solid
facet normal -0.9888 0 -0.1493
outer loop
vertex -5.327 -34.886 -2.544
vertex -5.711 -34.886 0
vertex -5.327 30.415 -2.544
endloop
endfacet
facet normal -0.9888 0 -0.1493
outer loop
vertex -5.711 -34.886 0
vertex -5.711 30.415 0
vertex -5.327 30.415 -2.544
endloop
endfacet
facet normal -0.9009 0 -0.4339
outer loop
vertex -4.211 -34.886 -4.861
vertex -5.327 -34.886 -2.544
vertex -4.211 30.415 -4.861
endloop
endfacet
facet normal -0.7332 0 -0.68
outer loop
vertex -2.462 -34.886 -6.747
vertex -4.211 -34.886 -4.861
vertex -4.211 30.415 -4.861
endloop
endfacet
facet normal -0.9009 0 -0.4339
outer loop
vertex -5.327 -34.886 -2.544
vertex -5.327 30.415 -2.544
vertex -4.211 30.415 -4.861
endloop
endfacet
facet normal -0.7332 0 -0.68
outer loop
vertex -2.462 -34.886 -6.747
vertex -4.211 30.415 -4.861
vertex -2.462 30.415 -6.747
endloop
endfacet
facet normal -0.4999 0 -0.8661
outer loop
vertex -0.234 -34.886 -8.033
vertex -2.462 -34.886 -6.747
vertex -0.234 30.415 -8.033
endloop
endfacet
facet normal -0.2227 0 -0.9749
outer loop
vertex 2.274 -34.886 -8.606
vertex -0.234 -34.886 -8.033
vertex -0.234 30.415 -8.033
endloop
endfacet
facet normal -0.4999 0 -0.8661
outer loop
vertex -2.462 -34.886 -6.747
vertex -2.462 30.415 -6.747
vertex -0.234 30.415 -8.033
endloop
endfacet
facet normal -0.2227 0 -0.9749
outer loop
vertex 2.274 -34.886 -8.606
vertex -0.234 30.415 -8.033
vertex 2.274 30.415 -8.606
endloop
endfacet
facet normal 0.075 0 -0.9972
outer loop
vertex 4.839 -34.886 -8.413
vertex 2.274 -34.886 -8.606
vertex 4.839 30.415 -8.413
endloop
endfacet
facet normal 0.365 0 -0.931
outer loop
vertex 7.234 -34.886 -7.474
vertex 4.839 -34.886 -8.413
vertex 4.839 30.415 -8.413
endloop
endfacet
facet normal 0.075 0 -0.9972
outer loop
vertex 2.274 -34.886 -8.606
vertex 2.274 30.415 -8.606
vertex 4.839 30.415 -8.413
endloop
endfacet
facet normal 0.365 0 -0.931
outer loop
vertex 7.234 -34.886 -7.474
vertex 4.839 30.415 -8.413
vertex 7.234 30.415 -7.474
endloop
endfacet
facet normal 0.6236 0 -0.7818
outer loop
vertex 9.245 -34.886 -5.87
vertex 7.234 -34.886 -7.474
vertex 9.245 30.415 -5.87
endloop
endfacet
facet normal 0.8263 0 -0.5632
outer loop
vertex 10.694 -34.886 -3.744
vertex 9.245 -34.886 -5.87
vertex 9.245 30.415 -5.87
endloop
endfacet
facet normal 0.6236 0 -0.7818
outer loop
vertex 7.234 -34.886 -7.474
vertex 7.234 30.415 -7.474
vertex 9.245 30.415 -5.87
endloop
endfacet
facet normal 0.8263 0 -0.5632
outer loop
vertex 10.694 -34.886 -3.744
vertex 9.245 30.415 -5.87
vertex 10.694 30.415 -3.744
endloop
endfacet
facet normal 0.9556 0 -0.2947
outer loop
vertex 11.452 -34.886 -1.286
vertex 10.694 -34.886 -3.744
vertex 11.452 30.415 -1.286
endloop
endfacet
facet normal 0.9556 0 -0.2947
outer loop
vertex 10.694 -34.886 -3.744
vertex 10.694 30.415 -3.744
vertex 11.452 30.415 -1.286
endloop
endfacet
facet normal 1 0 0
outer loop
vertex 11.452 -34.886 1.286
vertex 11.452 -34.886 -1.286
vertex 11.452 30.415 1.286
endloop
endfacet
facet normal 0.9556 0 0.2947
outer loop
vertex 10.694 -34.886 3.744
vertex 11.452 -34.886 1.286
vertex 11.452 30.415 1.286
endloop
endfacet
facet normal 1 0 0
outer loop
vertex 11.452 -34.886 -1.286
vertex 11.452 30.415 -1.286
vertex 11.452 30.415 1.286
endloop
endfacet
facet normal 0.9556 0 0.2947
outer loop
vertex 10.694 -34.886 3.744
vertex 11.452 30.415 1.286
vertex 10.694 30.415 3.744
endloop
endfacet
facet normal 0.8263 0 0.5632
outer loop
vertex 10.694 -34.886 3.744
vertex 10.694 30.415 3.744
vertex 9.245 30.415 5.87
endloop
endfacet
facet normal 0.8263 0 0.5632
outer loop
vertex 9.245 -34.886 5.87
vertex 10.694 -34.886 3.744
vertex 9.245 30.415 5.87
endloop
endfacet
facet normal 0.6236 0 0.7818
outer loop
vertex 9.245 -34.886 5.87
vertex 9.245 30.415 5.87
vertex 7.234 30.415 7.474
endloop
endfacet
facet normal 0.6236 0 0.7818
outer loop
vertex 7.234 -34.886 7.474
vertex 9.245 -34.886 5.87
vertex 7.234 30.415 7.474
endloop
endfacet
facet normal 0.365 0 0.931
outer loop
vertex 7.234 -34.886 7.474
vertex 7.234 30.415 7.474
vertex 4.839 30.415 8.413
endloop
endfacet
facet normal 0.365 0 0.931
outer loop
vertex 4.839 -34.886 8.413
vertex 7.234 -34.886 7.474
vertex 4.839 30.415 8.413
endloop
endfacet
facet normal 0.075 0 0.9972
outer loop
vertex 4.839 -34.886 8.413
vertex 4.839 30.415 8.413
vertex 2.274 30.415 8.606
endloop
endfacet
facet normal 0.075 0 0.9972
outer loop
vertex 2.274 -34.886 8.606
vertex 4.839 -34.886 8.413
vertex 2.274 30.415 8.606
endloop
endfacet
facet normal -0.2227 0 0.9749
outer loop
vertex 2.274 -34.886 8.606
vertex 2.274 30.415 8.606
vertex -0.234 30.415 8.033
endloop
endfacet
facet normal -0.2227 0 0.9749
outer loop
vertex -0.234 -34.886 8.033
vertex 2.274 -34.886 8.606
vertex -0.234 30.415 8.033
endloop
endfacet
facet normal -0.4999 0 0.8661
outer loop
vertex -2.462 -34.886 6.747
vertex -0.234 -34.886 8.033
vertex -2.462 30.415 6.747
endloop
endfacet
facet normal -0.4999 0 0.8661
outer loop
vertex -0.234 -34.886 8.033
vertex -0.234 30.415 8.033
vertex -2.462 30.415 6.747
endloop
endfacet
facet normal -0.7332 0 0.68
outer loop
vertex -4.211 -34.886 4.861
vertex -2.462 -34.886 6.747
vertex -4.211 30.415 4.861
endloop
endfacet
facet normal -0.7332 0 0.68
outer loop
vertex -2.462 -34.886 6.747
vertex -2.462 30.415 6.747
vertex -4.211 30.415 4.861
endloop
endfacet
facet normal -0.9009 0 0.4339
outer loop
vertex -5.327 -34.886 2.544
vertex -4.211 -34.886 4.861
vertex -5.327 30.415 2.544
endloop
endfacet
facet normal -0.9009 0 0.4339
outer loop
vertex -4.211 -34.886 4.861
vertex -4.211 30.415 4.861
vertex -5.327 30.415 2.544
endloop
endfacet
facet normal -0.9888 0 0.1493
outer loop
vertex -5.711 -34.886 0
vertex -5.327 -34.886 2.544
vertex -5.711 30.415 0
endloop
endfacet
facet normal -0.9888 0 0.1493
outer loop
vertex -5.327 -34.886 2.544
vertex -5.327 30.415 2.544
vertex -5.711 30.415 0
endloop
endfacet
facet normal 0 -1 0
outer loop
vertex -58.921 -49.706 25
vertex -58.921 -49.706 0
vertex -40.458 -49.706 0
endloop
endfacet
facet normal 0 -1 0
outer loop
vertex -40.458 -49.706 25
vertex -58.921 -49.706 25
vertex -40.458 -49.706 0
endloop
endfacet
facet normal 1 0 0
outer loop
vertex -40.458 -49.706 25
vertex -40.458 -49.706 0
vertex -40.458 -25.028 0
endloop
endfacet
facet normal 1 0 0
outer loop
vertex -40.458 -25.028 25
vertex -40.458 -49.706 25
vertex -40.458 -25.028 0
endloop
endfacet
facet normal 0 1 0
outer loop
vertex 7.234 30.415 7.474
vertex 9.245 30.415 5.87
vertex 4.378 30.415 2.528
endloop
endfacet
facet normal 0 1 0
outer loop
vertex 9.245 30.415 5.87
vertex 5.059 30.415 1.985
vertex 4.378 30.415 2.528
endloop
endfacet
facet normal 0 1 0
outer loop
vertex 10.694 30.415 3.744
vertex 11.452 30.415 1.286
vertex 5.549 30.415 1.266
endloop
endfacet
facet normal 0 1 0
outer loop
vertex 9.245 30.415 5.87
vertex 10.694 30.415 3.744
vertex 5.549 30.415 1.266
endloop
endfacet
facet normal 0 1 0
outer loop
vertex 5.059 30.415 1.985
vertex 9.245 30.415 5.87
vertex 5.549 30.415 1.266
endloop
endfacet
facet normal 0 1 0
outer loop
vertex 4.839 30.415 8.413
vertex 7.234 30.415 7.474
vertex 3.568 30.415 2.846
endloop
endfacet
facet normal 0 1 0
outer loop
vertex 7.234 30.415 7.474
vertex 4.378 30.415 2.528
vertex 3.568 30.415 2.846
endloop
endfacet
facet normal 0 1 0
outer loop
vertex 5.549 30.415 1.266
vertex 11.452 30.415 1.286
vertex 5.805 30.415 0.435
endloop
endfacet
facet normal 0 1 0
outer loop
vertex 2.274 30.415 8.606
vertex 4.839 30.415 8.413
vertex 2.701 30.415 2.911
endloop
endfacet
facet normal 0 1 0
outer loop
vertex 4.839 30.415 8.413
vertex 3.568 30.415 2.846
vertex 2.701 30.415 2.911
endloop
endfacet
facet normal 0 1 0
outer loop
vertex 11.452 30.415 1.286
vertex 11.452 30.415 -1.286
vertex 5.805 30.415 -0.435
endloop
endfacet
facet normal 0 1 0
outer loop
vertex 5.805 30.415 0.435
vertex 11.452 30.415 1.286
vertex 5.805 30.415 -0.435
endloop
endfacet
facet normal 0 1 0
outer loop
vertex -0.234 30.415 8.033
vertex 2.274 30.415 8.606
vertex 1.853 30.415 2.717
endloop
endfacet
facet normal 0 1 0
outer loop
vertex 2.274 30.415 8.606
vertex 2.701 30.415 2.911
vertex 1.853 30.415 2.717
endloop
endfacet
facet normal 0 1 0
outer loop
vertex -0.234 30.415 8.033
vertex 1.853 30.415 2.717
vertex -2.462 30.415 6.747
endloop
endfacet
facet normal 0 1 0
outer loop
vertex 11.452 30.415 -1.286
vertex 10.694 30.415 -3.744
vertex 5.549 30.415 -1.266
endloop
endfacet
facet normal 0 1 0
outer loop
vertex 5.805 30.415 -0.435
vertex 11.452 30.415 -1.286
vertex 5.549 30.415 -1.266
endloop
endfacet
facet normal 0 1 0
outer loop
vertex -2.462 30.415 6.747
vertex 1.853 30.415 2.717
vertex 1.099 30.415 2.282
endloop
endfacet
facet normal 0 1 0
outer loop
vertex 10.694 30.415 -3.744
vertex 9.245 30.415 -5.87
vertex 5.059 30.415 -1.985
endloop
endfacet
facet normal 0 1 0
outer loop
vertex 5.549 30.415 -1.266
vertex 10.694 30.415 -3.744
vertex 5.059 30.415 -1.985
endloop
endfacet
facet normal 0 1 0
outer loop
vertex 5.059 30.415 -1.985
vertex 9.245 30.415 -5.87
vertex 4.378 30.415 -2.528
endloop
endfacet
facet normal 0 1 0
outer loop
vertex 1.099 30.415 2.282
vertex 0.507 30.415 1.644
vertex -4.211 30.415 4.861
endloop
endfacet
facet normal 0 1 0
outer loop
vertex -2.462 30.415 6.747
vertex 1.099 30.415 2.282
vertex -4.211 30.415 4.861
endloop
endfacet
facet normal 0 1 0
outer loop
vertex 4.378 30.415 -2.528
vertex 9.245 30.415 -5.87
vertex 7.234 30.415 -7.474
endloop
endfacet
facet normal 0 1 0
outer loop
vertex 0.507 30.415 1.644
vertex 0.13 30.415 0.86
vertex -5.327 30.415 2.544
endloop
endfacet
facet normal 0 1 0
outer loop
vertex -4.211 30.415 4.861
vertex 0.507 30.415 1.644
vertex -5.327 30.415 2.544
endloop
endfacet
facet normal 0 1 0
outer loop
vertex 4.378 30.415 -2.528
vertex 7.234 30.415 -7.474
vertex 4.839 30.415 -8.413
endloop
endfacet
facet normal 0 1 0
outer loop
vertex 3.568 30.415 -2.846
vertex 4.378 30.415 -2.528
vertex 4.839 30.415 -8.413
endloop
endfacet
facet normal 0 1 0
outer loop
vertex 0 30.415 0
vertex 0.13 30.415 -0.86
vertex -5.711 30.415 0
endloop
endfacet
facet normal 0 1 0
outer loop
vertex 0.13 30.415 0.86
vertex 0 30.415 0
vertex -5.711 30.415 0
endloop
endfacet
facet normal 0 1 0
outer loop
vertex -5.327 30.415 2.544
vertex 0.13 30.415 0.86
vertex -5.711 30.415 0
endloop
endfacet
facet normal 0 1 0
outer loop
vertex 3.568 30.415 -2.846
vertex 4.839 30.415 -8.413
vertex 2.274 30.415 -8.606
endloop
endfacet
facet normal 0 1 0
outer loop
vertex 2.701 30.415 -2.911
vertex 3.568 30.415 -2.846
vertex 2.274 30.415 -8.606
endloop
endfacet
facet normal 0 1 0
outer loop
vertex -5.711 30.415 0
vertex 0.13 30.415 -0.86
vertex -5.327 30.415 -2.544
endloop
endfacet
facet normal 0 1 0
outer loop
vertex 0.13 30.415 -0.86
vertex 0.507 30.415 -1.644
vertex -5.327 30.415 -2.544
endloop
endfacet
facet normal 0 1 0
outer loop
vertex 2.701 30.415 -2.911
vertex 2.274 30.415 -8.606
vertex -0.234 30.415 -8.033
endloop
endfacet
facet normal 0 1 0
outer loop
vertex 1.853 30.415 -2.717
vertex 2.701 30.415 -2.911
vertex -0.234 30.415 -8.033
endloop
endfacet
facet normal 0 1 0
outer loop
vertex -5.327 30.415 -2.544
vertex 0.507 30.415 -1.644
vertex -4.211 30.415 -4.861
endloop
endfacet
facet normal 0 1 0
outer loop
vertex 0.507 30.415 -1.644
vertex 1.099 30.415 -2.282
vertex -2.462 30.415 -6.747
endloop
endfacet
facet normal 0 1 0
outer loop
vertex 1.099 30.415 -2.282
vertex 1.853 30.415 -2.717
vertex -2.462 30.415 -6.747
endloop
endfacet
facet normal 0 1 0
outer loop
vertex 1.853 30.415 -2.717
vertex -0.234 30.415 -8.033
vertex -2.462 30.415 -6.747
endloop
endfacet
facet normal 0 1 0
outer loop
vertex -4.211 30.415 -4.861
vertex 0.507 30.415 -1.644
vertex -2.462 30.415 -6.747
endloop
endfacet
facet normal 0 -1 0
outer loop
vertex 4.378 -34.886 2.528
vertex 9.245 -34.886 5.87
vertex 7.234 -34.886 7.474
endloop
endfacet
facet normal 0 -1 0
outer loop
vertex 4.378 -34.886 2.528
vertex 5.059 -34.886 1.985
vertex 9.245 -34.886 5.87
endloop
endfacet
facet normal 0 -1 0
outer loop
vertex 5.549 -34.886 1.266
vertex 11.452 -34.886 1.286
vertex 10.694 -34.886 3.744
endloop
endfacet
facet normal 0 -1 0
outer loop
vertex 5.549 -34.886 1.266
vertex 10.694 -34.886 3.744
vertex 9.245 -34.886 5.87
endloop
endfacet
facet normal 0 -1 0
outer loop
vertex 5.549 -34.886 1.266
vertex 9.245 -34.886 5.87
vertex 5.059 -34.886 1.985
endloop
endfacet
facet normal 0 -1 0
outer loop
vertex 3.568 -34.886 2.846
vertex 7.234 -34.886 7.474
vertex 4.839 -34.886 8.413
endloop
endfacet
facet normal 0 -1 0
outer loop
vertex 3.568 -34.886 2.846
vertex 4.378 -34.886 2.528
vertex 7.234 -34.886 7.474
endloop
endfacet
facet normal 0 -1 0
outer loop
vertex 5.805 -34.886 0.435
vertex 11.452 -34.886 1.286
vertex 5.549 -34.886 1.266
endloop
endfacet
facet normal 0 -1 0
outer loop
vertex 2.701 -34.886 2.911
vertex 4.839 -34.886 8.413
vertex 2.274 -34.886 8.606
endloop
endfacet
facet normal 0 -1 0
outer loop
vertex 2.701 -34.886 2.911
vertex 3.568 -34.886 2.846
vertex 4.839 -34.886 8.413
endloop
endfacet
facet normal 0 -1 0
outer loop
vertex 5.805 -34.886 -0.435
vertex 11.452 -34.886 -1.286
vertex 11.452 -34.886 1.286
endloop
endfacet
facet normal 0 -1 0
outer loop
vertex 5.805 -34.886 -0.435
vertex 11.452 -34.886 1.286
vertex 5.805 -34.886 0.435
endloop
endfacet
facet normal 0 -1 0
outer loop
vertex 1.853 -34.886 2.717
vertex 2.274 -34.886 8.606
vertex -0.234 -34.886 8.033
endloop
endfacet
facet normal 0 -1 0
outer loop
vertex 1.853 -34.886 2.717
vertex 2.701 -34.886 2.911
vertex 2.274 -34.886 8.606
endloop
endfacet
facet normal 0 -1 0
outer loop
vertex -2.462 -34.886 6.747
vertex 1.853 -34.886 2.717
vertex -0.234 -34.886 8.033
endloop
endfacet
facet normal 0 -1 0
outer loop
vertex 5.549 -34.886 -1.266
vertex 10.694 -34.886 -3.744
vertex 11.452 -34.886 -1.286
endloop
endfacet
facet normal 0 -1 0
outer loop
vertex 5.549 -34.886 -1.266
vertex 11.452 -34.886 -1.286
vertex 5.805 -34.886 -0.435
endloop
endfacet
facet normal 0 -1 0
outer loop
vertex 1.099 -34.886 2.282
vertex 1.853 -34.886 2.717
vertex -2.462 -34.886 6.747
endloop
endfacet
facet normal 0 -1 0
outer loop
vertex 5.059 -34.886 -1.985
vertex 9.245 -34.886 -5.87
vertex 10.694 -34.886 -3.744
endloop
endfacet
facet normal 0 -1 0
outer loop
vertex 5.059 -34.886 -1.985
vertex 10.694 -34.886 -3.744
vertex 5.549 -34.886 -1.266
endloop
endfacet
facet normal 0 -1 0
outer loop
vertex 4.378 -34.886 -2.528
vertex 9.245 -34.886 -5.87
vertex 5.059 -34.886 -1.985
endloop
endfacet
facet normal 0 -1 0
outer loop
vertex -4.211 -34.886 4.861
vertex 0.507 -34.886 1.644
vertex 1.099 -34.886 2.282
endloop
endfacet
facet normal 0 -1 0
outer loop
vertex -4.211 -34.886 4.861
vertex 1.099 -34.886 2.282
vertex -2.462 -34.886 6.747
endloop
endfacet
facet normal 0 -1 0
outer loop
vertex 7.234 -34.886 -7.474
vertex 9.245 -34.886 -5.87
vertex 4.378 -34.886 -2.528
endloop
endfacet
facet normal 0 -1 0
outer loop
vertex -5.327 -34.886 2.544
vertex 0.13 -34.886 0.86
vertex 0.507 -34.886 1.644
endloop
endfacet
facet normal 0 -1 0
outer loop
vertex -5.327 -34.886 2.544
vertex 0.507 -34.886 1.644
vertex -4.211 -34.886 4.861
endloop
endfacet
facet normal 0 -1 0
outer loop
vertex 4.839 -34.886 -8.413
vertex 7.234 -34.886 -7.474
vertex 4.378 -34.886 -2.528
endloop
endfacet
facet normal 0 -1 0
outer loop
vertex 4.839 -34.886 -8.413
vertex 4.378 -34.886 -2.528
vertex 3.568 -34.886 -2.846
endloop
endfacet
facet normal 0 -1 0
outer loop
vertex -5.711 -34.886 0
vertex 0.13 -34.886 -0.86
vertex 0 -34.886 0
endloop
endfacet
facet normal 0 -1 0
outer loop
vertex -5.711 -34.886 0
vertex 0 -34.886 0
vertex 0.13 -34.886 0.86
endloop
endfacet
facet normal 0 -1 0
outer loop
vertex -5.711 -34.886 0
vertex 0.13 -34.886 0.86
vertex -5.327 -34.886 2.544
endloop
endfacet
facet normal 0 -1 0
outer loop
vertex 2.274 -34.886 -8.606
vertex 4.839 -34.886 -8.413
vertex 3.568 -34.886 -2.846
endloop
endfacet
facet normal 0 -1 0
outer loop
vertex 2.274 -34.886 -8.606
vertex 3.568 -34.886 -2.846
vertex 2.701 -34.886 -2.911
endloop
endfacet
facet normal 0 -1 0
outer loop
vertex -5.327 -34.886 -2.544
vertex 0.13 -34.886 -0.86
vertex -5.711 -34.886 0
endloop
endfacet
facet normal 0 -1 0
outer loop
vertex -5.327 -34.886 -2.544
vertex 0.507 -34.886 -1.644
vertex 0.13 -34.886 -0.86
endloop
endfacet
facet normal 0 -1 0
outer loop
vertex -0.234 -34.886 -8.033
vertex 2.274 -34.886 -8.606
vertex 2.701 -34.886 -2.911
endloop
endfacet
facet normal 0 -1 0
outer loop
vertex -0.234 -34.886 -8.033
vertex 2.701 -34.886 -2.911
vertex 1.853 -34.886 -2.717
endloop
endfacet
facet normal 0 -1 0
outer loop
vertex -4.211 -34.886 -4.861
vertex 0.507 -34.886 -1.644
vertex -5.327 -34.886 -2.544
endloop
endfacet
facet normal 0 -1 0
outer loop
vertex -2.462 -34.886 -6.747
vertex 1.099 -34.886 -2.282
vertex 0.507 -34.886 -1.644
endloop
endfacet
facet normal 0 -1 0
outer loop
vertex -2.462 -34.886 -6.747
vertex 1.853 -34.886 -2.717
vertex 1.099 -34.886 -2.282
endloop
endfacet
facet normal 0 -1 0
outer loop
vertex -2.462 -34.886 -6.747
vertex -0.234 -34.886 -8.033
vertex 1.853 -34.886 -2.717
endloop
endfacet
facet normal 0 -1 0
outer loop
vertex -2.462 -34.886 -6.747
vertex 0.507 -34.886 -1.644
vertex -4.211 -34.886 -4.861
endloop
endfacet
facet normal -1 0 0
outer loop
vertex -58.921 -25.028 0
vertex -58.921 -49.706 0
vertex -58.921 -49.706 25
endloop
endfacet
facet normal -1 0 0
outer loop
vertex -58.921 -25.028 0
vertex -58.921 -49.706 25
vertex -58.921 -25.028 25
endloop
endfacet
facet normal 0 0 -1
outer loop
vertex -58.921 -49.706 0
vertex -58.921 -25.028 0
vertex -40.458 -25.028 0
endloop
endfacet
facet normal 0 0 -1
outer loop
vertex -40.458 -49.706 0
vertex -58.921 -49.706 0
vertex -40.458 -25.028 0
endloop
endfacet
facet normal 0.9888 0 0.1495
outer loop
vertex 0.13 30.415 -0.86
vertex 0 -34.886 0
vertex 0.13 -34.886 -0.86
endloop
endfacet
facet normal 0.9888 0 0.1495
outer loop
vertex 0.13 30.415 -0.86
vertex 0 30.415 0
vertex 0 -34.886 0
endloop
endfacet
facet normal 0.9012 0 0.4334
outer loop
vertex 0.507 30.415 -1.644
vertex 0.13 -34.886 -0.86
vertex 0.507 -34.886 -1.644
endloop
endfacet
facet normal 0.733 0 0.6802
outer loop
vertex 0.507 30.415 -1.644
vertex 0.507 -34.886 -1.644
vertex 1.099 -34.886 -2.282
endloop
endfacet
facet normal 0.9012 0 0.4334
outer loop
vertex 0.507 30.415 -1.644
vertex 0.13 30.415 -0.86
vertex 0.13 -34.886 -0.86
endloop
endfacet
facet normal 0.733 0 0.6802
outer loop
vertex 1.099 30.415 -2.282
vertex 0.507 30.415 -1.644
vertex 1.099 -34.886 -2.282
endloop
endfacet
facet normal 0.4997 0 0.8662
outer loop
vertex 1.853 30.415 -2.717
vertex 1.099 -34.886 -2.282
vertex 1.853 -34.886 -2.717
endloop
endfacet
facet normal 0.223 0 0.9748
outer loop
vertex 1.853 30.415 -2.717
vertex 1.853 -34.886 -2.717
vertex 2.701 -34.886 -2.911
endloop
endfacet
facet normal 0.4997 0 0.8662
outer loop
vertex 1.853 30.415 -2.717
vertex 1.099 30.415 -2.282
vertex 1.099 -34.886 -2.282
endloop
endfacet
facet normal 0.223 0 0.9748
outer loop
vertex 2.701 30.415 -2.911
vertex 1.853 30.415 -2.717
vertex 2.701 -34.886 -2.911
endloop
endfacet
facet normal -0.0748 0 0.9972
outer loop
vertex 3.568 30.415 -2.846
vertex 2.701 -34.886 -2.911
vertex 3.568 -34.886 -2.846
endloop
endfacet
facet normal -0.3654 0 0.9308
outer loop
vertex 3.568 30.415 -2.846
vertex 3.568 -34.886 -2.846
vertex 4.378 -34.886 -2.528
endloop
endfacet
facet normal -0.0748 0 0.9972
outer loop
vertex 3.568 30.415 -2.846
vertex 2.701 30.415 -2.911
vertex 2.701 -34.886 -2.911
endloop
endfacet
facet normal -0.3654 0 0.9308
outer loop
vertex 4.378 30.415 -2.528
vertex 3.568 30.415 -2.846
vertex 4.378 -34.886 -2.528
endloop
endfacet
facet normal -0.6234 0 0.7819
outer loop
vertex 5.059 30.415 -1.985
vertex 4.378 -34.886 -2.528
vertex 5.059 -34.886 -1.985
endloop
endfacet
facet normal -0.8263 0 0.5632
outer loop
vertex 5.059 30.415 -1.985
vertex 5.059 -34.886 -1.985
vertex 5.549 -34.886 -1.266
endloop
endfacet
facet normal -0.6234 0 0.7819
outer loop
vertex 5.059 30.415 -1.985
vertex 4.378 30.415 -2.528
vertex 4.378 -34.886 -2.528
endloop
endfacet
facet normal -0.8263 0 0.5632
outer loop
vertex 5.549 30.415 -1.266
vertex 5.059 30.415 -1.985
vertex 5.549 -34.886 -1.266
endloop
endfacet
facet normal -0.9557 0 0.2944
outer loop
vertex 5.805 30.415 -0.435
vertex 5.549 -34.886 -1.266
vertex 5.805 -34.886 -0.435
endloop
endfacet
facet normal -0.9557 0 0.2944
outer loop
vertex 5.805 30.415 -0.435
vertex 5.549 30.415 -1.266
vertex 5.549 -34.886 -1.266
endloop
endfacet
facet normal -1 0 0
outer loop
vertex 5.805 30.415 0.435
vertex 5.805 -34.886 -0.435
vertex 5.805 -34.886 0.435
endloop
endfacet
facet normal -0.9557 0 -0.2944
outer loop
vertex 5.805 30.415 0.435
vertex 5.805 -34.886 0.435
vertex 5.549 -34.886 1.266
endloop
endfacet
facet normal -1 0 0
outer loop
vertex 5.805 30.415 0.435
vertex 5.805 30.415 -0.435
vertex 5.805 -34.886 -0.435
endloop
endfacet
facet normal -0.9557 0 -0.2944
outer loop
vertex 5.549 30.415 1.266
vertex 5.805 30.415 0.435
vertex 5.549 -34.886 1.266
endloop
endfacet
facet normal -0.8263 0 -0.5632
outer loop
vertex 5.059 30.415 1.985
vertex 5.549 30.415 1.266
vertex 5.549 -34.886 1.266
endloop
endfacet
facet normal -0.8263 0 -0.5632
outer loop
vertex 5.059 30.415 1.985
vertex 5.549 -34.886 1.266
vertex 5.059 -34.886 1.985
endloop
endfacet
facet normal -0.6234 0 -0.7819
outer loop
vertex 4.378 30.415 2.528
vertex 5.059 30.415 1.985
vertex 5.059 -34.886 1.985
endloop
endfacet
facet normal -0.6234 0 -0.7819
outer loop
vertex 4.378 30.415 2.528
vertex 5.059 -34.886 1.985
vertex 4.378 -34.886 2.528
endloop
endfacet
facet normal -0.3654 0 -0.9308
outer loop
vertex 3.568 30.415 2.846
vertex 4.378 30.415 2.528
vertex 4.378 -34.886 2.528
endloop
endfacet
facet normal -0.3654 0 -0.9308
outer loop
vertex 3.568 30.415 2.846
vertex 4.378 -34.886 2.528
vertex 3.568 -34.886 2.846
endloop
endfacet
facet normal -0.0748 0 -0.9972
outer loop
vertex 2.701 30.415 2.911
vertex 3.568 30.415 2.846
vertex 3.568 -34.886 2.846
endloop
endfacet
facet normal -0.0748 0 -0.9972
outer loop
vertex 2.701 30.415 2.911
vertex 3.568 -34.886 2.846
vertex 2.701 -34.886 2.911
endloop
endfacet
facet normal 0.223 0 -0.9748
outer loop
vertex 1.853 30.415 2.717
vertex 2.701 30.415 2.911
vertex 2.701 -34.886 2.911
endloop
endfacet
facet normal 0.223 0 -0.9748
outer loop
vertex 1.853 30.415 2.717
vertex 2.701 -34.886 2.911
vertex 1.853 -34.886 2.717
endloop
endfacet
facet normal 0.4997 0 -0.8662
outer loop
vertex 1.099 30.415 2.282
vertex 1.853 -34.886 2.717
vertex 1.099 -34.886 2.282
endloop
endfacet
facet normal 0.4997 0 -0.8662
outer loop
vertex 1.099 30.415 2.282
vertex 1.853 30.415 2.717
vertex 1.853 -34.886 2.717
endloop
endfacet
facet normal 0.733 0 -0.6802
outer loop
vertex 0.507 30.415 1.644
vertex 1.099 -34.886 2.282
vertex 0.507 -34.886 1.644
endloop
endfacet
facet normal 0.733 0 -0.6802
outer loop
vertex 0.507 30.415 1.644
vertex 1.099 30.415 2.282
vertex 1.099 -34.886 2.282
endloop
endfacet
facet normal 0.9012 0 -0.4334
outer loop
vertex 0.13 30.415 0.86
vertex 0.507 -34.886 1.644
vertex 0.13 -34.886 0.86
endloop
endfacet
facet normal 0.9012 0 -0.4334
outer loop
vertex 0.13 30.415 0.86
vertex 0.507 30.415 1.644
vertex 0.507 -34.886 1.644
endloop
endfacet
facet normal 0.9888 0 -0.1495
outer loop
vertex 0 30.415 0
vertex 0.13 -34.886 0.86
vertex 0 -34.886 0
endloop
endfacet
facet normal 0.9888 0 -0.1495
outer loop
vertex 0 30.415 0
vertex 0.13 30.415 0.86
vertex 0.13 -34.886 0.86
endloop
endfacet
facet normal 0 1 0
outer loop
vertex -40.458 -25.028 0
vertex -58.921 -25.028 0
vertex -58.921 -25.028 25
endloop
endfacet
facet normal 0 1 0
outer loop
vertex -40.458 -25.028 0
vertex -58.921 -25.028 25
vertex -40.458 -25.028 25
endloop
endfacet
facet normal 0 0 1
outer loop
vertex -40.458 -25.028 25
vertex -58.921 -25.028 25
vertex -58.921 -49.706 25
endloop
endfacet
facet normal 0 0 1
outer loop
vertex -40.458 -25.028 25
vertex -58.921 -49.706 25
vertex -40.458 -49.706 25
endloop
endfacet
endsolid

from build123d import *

# Parameters (mm, degrees)
F0_W     = 18.462919
F0_H     = 24.678637
F1_DEPTH = 25
F2_W     = 5.710856
F2_H     = 65.300852


with BuildPart() as f1:
    # F0 (on Top) → F1 (new body)
    with BuildSketch(Plane.XY):
        with Locations((-49.689777, -37.366877)):
            Rectangle(F0_W, F0_H)
    extrude(amount=F1_DEPTH)


with BuildPart() as f3:
    # F2 (on Top) → F3 (revolve)
    with BuildSketch(Plane.XY):
        with Locations((-2.855428, -2.235092)):
            Rectangle(F2_W, F2_H)
    revolve(axis=Axis((2.918897, -2.405457, 0), (0, -1, 0)))


solid = Compound([f1.part, f3.part])
